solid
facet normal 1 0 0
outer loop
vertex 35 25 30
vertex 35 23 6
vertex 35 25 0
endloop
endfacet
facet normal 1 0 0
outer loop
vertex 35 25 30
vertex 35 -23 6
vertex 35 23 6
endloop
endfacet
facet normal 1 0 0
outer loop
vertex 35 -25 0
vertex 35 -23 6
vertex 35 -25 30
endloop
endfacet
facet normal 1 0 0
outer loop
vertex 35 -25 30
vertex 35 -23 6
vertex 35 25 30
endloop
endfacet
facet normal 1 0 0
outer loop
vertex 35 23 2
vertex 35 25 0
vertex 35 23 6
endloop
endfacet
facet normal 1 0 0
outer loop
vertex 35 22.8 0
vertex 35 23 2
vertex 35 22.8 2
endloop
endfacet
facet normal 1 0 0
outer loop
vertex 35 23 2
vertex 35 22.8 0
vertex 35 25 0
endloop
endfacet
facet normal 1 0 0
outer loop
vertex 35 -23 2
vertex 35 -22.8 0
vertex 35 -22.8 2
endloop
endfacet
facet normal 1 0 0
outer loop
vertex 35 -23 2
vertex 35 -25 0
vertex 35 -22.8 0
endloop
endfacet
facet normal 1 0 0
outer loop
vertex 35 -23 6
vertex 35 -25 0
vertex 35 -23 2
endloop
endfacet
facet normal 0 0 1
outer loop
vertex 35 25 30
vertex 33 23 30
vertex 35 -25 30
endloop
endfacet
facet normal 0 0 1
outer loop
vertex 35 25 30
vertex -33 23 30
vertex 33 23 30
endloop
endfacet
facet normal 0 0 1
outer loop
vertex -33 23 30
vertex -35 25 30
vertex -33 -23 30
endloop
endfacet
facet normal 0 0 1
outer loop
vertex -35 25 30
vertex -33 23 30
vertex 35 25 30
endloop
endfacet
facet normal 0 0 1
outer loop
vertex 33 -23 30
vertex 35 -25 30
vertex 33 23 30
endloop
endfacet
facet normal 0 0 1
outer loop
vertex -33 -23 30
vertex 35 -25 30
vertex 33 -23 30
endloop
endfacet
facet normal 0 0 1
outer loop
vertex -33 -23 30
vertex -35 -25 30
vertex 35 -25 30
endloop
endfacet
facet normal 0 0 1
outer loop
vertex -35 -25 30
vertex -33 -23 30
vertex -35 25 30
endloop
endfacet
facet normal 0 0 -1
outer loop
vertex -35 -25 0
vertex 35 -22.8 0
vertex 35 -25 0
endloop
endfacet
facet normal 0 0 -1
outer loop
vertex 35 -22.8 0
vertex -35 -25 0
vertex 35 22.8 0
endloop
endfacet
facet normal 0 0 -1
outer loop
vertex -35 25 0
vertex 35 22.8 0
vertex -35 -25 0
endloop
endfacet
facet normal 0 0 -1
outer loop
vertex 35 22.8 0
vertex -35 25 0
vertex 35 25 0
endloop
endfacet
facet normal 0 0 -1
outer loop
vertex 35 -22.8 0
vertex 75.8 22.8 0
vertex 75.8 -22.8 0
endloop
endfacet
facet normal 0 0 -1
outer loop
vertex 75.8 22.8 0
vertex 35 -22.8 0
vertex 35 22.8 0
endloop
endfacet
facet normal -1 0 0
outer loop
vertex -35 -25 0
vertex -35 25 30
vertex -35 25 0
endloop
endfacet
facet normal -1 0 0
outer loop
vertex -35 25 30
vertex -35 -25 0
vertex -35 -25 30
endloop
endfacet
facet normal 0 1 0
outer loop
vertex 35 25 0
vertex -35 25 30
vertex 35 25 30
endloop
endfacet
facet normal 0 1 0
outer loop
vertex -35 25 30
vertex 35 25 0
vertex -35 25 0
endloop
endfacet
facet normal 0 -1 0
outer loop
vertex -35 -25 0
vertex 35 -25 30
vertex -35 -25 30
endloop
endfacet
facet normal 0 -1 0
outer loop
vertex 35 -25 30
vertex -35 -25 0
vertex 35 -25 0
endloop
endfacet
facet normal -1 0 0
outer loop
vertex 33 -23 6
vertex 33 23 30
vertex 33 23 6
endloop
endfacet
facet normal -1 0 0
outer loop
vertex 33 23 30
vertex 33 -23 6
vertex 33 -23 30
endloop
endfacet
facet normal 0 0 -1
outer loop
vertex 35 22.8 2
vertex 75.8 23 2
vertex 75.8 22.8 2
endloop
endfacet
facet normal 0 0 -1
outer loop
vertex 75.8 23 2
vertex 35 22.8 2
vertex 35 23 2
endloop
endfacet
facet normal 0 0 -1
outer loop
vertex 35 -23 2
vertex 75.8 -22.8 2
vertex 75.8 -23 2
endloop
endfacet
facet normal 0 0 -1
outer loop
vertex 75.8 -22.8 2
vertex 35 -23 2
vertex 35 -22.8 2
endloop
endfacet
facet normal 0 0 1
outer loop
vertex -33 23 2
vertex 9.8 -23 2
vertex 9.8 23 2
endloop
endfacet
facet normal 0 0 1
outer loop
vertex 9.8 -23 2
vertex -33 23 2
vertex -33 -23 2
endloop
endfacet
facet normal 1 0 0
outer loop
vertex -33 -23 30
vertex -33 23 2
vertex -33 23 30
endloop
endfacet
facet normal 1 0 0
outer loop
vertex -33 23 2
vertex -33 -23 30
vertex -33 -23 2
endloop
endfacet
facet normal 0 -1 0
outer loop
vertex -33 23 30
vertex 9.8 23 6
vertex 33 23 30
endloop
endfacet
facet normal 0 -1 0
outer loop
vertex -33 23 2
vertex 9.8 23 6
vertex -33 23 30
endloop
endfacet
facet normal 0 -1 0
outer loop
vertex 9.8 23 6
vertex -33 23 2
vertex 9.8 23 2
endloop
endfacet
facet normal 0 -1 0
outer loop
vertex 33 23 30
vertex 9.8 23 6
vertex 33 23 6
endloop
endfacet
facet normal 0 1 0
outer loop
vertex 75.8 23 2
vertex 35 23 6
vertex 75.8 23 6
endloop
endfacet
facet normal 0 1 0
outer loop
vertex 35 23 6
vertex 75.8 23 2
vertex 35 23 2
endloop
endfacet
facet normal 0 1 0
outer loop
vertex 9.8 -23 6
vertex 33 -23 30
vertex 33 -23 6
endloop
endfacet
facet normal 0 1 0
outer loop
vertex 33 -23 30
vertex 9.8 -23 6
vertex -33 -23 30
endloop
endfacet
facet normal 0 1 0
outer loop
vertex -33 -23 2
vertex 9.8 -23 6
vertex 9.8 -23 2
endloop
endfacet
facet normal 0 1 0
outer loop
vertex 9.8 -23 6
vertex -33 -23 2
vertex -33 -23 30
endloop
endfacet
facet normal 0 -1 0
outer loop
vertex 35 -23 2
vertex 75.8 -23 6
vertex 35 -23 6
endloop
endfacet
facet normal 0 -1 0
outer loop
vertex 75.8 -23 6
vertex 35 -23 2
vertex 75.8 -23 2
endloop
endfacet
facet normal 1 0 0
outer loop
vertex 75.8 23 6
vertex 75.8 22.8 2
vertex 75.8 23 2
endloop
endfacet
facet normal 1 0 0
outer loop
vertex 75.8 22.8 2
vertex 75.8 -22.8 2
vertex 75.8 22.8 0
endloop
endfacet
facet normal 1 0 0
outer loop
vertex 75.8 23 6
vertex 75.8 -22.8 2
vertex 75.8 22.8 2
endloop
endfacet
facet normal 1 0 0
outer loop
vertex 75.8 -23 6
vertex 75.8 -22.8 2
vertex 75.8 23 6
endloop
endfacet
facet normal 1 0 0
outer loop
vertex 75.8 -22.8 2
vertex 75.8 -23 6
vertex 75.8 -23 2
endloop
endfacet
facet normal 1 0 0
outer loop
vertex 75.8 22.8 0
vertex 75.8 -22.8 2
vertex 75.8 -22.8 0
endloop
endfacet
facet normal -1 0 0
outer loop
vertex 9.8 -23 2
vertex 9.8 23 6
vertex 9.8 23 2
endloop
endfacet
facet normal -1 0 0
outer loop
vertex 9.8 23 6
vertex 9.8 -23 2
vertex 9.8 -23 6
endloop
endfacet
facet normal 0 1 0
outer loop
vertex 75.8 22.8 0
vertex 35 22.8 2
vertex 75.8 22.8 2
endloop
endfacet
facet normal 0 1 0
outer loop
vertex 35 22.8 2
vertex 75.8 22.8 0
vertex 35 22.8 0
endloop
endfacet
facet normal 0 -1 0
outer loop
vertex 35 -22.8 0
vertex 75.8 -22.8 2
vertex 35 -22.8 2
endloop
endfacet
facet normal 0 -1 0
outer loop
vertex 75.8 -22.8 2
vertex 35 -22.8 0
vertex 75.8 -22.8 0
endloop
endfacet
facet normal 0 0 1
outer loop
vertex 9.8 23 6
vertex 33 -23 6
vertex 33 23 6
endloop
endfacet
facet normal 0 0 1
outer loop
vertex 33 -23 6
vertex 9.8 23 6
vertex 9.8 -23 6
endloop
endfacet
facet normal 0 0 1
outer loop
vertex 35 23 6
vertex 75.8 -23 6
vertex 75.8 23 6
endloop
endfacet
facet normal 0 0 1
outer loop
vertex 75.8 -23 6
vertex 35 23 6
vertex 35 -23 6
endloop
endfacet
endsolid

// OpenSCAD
// Two-part enclosure for a small electronics board (e.g. Arduino-based temperature logger)
// Prints together in one job: box on the left, upside-down lid on the right, with a gap.
// Units: mm. No external libraries.

// ---------------- Parameters ----------------
box_x      = 70;    // box outer length (X)
box_y      = 50;    // box outer width (Y)
box_z      = 30;    // box height (Z)
wall       = 2;     // box wall thickness
floor      = 2;     // box floor thickness
eps        = 0.5;   // cutter overshoot past box faces

lip_t      = 1.5;   // lid lip wall thickness
lip_h      = 4;     // lid lip height (from plate top)
lip_x      = 65.6;  // lid lip outer length (X)
lip_y      = 45.6;  // lid lip outer width (Y)
clearance  = 0.2;   // side clearance between lip and box opening
plate_t    = 2;     // lid plate thickness (lies on bed)
gap        = 10;    // gap between box and lid on the bed

$fn = 64;

// Derived
box_in_x   = box_x - 2 * wall;   // box inner length
box_in_y   = box_y - 2 * wall;   // box inner width
lip_x2     = lip_x + 2 * clearance;
lip_y2     = lip_y + 2 * clearance;

// ---------------- Model ----------------
union() {
    // Part 1: Box, open top, centred in X/Y, resting on z = 0
    difference() {
        translate([-box_x / 2, -box_y / 2, 0])
            cube([box_x, box_y, box_z]);
        translate([-box_in_x / 2, -box_in_y / 2, floor])
            cube([box_in_x, box_in_y, box_z - floor + eps]);
    }

    // Part 2: Lid, printed upside down. Plate on the bed, lip above it.
    // Placed on the +X side of the box with the given gap.
    union() {
        // Base plate
        translate([gap - (lip_x2 - lip_x) / 2, -lip_y / 2, 0])
            cube([lip_x2, lip_y, plate_t]);

        // Rectangular lip (wall) on top of the plate
        translate([gap - (lip_x2 - lip_x) / 2, -lip_y2 / 2, plate_t])
            cube([lip_x2, lip_y2, lip_h]);
    }
}
